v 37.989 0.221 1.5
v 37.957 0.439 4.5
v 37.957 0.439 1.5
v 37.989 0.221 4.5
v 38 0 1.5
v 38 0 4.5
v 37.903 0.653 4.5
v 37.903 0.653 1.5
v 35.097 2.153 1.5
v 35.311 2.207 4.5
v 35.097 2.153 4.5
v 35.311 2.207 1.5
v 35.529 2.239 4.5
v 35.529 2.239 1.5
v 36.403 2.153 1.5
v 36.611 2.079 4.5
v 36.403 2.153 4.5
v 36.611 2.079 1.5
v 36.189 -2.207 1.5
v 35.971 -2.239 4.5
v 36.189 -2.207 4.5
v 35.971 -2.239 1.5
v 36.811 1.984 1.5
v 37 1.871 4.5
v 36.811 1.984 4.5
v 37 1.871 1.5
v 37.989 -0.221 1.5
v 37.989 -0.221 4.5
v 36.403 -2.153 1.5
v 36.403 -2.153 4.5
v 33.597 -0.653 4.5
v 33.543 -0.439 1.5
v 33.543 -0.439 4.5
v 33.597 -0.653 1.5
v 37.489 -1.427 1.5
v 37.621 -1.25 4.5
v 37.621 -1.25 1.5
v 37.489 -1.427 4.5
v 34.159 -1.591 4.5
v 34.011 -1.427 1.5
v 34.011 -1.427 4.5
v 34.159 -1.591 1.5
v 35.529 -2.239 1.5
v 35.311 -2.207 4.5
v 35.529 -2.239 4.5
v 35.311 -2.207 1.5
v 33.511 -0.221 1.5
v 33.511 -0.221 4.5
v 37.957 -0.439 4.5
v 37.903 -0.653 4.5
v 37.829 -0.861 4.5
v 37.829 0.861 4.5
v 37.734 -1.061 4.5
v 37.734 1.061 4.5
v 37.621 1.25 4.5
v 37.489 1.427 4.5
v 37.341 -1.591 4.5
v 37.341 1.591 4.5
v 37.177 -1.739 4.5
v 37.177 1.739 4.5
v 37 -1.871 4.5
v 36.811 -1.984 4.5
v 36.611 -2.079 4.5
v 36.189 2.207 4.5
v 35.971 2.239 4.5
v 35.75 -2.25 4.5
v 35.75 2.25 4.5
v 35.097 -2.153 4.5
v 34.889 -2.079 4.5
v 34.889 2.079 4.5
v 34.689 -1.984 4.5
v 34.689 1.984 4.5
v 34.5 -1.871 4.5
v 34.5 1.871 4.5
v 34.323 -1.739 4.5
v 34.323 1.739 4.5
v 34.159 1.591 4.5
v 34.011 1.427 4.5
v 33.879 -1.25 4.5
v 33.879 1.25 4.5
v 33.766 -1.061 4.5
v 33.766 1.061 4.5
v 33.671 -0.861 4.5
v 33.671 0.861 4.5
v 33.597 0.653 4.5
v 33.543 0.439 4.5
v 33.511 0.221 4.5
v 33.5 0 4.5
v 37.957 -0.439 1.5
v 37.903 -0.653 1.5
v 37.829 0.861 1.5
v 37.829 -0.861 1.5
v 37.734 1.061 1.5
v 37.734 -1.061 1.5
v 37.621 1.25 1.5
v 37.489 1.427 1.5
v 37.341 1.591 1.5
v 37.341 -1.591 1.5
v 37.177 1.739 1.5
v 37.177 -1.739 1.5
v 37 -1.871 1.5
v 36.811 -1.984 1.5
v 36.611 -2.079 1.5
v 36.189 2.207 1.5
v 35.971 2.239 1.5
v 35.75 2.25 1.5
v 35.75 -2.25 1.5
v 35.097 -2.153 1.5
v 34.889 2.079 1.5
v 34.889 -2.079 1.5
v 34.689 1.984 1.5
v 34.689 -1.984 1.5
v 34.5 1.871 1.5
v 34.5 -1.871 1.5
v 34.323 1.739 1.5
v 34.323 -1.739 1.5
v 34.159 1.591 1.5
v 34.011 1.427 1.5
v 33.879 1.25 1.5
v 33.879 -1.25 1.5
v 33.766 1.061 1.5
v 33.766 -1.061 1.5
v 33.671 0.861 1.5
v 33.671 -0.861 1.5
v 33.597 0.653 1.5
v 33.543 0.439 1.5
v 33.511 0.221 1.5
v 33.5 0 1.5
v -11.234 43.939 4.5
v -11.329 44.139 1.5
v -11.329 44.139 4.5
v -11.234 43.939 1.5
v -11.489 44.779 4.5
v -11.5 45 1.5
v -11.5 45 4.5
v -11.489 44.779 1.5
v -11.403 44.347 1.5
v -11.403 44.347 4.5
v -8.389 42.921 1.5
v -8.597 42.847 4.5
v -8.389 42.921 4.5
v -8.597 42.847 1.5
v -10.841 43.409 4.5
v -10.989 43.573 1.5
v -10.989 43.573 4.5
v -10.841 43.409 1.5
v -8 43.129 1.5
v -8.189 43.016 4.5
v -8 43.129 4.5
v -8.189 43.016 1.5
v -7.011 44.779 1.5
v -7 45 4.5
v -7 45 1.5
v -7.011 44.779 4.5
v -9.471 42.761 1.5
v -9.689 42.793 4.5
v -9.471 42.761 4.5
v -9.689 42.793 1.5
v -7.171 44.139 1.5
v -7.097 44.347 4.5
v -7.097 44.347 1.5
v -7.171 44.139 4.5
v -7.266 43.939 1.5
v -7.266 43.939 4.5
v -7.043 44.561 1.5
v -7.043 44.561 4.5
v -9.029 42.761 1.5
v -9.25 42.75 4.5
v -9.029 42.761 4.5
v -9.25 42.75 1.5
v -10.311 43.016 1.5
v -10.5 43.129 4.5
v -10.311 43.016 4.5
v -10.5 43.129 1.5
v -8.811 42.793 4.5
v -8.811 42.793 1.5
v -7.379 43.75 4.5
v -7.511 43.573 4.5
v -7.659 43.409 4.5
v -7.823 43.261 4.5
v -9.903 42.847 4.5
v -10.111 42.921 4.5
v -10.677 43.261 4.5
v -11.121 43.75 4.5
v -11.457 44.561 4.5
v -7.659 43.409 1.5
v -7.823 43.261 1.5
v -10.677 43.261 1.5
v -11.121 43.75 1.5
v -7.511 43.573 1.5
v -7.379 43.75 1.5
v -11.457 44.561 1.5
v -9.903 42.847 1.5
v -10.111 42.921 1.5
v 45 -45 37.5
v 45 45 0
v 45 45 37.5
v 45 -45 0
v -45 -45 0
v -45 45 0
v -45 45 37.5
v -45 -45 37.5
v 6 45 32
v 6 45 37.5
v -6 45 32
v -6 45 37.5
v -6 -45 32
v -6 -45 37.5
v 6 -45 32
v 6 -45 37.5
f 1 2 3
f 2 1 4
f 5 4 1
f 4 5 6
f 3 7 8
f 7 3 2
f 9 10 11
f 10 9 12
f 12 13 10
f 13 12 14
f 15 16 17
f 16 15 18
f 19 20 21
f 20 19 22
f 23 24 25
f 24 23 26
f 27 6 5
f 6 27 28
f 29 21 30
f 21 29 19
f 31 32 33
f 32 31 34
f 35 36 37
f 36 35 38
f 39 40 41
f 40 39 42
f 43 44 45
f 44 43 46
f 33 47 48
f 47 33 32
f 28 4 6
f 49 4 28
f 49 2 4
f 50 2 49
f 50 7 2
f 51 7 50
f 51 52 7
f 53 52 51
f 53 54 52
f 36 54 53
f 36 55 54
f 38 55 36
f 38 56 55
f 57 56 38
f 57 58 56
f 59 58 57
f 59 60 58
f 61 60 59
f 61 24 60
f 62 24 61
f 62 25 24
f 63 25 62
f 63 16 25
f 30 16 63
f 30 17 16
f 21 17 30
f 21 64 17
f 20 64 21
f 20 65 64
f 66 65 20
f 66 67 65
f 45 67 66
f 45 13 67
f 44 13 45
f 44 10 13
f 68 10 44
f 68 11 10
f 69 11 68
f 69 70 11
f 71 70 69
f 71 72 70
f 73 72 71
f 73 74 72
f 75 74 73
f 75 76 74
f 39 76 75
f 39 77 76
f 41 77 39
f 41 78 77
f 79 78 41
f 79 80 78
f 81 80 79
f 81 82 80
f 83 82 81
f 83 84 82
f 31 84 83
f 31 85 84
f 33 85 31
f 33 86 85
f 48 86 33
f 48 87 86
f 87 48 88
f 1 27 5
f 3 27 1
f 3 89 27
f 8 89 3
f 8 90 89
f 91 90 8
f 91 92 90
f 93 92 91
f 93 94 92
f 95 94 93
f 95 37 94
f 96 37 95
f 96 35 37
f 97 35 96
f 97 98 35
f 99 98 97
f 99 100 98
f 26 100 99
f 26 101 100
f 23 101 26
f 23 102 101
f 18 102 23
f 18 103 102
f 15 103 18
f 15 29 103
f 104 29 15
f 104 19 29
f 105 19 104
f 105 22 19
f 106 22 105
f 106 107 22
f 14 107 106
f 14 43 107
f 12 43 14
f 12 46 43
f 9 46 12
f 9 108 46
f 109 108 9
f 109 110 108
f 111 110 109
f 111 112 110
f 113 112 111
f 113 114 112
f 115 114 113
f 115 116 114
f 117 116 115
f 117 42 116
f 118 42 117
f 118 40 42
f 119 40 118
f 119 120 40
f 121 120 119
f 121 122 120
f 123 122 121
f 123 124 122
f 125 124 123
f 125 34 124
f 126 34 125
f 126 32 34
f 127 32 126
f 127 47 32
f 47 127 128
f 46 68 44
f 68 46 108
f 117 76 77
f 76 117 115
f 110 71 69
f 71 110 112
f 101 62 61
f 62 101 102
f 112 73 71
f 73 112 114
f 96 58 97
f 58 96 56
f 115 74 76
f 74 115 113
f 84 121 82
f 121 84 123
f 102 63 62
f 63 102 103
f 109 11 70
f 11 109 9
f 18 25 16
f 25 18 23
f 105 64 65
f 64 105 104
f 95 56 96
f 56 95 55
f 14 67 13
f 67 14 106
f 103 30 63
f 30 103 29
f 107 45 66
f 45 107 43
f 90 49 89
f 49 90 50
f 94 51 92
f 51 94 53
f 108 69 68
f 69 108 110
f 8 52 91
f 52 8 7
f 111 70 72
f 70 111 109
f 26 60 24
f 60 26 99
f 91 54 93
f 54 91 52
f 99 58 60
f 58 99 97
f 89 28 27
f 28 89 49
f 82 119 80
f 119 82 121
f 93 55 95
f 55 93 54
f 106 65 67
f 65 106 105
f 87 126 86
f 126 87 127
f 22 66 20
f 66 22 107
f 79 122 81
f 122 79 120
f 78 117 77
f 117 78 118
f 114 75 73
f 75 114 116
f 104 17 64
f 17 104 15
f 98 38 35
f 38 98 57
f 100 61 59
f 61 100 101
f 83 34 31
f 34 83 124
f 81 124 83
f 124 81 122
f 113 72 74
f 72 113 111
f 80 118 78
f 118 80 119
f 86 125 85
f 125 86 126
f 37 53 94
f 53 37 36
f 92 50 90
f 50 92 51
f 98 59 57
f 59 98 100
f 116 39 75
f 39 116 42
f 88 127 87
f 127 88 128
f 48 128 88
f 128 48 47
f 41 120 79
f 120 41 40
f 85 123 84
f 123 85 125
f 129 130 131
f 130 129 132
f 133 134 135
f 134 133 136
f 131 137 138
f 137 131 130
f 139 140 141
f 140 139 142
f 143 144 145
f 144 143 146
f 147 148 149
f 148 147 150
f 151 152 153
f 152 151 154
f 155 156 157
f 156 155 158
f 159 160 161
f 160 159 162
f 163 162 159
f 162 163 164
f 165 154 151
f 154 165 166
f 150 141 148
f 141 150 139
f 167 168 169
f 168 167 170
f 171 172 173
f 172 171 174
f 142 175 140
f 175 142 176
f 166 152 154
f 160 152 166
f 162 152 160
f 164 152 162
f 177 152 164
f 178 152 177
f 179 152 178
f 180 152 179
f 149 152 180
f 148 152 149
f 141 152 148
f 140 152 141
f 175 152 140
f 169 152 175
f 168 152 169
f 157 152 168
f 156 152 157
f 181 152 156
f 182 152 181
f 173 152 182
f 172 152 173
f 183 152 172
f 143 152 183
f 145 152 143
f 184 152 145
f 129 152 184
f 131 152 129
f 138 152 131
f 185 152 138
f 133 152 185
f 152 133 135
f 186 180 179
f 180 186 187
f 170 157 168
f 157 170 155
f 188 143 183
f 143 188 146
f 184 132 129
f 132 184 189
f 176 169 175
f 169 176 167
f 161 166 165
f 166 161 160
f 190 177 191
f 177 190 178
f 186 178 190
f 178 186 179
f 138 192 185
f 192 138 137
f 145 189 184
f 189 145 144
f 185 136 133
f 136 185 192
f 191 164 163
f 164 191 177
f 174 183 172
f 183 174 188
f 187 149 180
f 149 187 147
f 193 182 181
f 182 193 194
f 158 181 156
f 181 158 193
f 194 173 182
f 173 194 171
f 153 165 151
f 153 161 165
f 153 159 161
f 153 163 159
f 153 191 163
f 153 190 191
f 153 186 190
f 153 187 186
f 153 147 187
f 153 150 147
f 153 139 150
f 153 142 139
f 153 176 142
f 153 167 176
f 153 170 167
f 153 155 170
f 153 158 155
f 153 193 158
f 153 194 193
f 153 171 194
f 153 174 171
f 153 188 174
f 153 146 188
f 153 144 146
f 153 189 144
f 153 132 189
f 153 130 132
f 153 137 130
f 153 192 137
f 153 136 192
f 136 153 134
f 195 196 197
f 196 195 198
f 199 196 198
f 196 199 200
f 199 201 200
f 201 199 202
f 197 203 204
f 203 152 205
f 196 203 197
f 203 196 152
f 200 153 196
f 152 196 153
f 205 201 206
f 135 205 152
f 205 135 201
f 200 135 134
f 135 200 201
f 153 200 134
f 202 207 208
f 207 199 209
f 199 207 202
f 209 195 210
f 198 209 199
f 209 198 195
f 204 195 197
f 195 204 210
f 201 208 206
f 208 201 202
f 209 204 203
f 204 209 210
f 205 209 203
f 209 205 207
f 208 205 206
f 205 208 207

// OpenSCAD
// DIY magnetic stirrer housing - upside-down open box over PC fan
// Print orientation: top plate on bed (z = 0), walls rise to open top (z = 40)

// ---------- Parameters ----------
plate_t      = 2;     // top plate thickness
wall_t       = 2.5;   // wall thickness
box_h        = 40;    // total height (open top at z = 40)
outer_x      = 90;    // outer size in X
outer_y      = 90;    // outer size in Y
screw_h      = 4.5;   // M4 screw hole diameter
screw_n      = 4;     // number of screw holes
screw_pitch  = 71.5;  // square pattern pitch (centre to centre)
notch_w      = 12;    // cable notch width
notch_d      = 8;     // notch depth from open edge
eps          = 0.5;   // cutter overshoot past faces

$fn = 64;

// ---------- Model ----------
difference() {
    // Outer block
    translate([-outer_x/2, -outer_y/2, 0])
        cube([outer_x, outer_y, box_h]);

    // Open top: cut down to z = box_h - wall_t
    translate([-outer_x/2, -outer_y/2, box_h - wall_t])
        cube([outer_x, outer_y, wall_t + eps]);

    // Screw holes through top plate
    for (i = [0 : screw_n - 1]) {
        a = (i < 2) ? 0 : 90;   // two rows along Y
        translate([screw_pitch/2 - a/2, a/2, plate_t - eps])
            cylinder(d = screw_h, h = plate_t + 2*eps, $fn = 64);
    }

    // Cable notch in one wall (centred along X, from z = 32 to z = 40)
    translate([-notch_w/2, -outer_y/2 - eps, box_h - notch_d])
        cube([notch_w, outer_y + 2*eps, notch_d + eps]);
}
